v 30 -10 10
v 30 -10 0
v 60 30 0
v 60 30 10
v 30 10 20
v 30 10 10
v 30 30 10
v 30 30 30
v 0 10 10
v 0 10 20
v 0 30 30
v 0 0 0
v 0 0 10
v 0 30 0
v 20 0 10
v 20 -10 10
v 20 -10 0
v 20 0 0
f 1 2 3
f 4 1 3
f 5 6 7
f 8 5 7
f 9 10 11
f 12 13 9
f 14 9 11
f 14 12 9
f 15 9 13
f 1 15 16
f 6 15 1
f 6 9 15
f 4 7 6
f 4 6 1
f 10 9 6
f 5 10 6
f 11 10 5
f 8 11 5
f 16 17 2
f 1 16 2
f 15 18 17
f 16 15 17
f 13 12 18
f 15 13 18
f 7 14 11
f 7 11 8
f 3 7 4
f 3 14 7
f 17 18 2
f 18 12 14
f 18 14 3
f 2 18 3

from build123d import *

# Parameters (mm, degrees)
F1_DEPTH = 10
F2_W     = 30
F2_H     = 20
F3_DEPTH = 20
F4_SIZE2 = 9.99999
F4_SIZE  = 19.99999


# Not quite as in the source:
# - a fillet or chamfer is up to 0.001 mm smaller than in the source, because OpenCascade refuses the exact size


with BuildPart() as f1:
    # F0 (on Top) → F1 (new body)
    with BuildSketch(Plane.XY):
        Polygon((0, 30), (0, 0), (20, 0), (20, -10), (30, -10), (60, 30), align=None)
    extrude(amount=F1_DEPTH)

    # F2 (on face) → F3 (join)
    with BuildSketch(Plane.XY.offset(10)):
        with Locations((15, 20)):
            Rectangle(F2_W, F2_H)
    extrude(amount=F3_DEPTH)

    # F4 (size 20 and 10 in the source; OpenCascade refuses exactly that, so slightly less here)
    f4_edges = [f1.edges().sort_by_distance(p)[0] for p in [
        (15, 10, 30),
    ]]
    f4_side = f1.faces().sort_by_distance((15, 20, 30))[0]
    chamfer(f4_edges, length=F4_SIZE, length2=F4_SIZE2, reference=f4_side)


solid = f1.part
